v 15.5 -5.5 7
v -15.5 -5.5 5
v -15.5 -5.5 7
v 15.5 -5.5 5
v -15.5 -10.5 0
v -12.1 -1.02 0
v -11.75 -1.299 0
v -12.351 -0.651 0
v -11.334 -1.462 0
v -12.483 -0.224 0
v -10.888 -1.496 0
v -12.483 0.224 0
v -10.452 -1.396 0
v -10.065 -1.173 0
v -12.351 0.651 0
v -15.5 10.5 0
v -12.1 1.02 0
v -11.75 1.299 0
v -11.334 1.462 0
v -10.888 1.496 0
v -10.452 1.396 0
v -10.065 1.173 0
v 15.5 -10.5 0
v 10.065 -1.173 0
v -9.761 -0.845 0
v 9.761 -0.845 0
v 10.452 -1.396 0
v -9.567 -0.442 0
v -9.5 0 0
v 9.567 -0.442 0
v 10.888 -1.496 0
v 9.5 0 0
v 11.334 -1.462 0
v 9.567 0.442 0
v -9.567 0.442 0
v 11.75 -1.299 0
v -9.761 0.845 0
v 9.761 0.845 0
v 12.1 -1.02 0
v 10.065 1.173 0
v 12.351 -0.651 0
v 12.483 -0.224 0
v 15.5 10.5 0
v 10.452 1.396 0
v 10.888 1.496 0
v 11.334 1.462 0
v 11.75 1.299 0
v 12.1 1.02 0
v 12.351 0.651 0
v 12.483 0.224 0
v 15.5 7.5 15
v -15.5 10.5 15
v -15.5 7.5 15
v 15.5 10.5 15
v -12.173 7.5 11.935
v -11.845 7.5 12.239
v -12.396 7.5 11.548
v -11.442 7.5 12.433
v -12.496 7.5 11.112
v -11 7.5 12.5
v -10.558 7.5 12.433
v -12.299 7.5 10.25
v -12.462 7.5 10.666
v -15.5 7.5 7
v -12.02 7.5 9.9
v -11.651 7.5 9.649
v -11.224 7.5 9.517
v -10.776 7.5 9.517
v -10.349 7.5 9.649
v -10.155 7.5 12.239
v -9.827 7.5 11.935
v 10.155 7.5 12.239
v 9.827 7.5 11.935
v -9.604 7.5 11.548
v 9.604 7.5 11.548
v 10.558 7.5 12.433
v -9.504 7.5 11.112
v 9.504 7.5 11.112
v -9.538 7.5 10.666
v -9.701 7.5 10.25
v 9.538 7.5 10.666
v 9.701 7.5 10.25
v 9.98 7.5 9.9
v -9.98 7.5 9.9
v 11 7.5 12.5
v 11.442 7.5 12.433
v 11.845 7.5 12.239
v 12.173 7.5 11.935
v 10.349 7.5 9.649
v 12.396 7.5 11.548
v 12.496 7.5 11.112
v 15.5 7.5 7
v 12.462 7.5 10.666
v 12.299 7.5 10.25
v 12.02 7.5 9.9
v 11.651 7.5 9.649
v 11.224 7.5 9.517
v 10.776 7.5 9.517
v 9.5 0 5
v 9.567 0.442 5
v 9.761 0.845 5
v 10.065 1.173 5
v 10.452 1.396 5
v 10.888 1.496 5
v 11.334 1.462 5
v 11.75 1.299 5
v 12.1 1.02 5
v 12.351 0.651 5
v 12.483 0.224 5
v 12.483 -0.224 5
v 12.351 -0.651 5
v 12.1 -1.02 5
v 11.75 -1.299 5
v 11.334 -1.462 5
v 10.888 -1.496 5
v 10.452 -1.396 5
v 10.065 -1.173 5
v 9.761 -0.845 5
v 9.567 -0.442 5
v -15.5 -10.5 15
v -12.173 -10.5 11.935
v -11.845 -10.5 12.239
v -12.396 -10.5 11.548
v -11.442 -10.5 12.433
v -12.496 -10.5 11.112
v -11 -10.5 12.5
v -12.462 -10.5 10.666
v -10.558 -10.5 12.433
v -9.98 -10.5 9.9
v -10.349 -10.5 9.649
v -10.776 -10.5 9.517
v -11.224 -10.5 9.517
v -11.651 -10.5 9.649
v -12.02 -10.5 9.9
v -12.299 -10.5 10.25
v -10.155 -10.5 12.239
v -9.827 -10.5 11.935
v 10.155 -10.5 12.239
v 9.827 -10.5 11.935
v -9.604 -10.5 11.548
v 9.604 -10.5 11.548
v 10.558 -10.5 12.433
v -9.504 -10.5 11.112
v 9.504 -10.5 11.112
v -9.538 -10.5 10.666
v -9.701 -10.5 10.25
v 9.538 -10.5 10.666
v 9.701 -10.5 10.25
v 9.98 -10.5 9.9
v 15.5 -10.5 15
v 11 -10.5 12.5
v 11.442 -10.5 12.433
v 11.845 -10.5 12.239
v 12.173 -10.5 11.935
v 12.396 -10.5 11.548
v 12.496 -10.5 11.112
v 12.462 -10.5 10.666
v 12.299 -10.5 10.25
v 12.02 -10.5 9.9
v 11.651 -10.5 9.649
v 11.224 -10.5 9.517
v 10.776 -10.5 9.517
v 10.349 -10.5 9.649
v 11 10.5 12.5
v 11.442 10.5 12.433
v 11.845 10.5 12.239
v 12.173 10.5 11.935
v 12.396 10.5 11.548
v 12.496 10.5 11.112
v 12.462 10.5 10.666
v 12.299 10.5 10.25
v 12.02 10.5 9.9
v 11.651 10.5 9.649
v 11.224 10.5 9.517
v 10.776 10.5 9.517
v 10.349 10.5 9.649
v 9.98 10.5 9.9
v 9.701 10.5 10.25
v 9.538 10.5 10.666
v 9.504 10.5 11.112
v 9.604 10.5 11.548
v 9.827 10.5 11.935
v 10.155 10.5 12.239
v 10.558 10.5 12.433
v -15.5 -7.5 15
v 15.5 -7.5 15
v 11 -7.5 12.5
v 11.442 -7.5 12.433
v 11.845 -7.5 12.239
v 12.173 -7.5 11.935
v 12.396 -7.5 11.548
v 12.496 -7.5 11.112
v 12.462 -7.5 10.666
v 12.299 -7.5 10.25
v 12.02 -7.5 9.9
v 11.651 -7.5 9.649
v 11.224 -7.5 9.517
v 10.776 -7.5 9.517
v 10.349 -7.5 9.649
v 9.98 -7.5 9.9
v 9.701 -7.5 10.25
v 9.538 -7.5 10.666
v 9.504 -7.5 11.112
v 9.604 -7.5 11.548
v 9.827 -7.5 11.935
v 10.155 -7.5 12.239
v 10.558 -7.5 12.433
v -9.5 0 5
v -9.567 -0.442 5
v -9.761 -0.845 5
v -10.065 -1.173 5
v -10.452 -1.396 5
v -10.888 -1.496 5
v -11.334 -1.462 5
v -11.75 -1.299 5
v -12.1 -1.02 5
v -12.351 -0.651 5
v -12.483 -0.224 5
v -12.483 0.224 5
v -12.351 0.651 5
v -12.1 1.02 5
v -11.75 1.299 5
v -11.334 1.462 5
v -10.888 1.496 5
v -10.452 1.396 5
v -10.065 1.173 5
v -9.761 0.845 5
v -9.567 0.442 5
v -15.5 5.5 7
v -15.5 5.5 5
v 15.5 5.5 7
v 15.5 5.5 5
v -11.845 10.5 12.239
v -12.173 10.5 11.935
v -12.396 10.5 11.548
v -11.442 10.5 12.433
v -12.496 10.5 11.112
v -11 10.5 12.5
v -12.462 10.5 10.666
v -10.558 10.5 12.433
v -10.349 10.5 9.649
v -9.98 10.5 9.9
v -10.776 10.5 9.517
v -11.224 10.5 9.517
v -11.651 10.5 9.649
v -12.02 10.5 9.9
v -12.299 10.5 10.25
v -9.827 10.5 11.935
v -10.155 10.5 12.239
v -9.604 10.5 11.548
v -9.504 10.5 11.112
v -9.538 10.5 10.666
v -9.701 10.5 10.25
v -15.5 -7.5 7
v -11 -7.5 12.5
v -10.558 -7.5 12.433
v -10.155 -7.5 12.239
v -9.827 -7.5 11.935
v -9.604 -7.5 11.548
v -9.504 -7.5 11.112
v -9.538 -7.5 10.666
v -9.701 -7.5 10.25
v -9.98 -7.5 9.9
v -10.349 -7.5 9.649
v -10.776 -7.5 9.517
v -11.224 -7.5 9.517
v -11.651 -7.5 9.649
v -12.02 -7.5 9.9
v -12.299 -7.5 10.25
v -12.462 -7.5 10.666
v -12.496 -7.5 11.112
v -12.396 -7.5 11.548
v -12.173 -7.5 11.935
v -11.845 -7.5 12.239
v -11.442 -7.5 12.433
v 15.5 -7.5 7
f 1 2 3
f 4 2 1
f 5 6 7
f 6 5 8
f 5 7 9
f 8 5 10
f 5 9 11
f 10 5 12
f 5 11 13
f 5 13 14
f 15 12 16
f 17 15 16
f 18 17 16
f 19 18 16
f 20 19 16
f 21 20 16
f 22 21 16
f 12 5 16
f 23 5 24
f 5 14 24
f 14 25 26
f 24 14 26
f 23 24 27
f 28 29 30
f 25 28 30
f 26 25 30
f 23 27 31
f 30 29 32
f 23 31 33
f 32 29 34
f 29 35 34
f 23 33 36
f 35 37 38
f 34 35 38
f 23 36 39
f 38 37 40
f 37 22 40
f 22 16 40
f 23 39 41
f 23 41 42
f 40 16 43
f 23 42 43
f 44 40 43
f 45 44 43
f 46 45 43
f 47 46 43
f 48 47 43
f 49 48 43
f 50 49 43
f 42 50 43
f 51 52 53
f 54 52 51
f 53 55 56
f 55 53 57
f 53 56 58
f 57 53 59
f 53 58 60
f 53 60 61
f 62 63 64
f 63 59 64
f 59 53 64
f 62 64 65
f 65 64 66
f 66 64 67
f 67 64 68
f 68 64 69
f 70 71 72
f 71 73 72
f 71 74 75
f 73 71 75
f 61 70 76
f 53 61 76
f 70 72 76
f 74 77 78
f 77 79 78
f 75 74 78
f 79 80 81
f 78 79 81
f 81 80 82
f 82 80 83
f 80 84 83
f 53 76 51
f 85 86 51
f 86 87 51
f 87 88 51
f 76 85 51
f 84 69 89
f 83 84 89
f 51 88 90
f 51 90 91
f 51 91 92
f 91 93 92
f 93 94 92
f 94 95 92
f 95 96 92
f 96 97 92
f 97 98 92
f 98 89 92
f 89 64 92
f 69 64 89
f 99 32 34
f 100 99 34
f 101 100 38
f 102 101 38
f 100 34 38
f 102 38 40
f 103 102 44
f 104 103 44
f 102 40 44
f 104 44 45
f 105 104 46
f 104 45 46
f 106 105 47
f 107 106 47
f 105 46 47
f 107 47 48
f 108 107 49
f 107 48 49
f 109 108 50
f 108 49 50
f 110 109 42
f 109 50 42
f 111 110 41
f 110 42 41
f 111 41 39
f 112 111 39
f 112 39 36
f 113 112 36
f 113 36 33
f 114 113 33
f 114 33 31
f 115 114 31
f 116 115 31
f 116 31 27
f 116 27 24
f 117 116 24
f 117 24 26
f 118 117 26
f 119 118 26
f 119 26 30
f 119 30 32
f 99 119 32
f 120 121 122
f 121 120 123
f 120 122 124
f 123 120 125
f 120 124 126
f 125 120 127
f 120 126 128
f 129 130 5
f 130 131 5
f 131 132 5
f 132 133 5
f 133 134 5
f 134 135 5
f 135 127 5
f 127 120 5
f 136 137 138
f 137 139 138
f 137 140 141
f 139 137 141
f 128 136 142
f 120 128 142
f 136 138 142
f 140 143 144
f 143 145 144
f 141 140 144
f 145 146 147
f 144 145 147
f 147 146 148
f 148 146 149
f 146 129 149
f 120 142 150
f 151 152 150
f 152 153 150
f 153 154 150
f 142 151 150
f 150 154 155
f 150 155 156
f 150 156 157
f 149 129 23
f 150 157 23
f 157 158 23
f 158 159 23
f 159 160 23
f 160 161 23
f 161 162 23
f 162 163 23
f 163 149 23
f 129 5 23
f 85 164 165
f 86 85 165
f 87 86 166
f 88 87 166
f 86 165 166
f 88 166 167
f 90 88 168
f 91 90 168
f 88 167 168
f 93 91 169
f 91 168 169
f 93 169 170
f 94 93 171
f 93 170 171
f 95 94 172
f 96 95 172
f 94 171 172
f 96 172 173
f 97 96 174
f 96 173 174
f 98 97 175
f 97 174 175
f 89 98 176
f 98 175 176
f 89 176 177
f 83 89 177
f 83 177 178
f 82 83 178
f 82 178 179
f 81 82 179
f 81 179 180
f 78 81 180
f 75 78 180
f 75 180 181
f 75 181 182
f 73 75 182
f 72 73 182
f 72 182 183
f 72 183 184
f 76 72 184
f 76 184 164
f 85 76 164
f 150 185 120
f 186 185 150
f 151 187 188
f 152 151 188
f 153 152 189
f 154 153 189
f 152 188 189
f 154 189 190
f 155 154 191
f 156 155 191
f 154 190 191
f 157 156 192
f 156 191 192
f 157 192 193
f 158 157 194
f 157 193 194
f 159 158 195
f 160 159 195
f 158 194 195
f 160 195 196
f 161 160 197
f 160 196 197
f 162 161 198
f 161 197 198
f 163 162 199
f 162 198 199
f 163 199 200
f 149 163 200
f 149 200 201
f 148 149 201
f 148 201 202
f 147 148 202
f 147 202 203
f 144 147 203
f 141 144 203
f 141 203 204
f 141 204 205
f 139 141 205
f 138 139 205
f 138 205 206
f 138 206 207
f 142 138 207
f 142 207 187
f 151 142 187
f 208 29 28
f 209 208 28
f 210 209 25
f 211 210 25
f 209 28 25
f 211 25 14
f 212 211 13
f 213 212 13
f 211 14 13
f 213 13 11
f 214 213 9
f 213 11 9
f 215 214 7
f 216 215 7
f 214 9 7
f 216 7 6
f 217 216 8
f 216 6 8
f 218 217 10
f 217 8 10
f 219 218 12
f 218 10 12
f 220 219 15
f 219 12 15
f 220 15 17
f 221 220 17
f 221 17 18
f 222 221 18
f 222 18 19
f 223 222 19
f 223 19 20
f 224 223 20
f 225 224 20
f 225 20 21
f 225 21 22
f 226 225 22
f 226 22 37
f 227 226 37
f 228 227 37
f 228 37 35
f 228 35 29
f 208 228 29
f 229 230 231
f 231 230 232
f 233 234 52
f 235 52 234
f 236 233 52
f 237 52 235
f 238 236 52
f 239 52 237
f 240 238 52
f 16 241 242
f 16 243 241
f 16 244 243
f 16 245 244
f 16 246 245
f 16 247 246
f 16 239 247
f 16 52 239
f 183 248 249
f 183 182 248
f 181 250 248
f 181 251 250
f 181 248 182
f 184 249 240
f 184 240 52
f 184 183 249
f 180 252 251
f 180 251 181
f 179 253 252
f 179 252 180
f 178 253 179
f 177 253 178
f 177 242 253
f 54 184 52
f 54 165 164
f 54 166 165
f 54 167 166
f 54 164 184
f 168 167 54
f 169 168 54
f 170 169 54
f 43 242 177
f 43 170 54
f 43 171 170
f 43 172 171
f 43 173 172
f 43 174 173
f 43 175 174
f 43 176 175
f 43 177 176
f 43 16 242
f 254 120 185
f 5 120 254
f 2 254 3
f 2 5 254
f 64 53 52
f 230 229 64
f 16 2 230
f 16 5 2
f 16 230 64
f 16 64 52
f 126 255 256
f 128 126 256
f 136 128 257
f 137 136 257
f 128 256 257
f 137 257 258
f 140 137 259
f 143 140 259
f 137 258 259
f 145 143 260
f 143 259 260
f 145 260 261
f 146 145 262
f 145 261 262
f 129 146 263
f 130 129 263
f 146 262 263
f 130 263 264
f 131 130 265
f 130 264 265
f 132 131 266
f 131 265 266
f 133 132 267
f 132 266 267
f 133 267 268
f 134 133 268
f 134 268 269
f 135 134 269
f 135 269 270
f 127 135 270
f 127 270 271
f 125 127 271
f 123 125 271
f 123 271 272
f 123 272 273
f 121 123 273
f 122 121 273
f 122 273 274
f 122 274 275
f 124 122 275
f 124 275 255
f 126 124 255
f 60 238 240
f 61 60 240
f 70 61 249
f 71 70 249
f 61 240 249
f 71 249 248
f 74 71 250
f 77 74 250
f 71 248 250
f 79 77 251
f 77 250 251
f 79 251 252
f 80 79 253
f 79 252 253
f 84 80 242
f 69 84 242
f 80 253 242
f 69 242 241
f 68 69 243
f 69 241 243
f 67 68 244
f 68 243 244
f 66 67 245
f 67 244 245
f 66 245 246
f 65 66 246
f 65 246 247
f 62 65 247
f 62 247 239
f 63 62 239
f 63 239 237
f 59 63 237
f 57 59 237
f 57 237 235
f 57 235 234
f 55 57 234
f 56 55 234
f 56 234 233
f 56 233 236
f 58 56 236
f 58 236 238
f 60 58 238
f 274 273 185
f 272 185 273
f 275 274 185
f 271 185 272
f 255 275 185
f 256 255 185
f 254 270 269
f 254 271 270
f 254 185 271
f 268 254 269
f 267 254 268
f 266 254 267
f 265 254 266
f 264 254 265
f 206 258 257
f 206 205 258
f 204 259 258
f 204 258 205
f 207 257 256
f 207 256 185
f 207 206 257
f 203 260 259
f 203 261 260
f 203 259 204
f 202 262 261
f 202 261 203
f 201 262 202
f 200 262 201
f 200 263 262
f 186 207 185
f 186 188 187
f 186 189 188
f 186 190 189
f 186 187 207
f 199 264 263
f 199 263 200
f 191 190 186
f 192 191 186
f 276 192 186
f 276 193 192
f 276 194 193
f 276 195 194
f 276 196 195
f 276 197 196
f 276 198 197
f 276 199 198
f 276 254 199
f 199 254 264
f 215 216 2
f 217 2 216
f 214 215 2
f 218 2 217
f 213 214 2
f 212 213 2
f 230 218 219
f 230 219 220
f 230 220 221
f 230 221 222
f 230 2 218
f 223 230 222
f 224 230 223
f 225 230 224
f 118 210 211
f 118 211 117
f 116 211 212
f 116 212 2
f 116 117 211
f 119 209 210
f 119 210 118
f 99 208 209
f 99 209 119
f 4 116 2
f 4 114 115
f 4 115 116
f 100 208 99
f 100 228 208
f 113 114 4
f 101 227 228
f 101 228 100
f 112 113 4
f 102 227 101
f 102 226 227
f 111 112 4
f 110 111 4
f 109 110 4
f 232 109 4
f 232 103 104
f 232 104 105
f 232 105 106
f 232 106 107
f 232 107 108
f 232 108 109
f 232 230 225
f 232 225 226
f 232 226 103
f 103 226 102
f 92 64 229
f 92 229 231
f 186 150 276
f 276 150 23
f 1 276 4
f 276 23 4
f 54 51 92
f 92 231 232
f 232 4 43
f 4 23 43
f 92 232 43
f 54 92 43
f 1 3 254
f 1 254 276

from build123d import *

# Parameters (mm, degrees)
SKETCH_1_W          = 31
SKETCH_1_H          = 21
EXTRUDE_1_DEPTH     = 5
SKETCH_2_W          = 31
SKETCH_2_H          = 3
EXTRUDE_2_DEPTH     = 10
SKETCH_5_R          = 1.5
CUT_EXTRUDE_2_DEPTH = 31.103986447
SKETCH_6_R          = 1.5
CUT_EXTRUDE_3_DEPTH = 24.989581072
SKETCH_7_W          = 31
SKETCH_7_H          = 2
EXTRUDE_3_DEPTH     = 2


with BuildPart() as part:
    # 草图1 → 凸台-拉伸1 (new body)
    with BuildSketch(Plane.XY):
        Rectangle(SKETCH_1_W, SKETCH_1_H)
    extrude(amount=EXTRUDE_1_DEPTH)

    # 草图2 → 凸台-拉伸2 (add)
    with BuildSketch(Plane.XY.offset(5)):
        with Locations((0, 9)):
            Rectangle(SKETCH_2_W, SKETCH_2_H)
        with Locations((0, -9)):
            Rectangle(SKETCH_2_W, SKETCH_2_H)
    extrude(amount=EXTRUDE_2_DEPTH)

    # 草图5 → 切除-拉伸2 (cut, through all)
    with BuildSketch(Plane(origin=(0, 10.5, 0), x_dir=(1, 0, 0), z_dir=(0, 1, 0))):
        with Locations(Location((11, -11, 0), (0, 0, 270))):
            Circle(SKETCH_5_R)
        with Locations(Location((-11, -11, 0), (0, 0, 270))):
            Circle(SKETCH_5_R)
    extrude(amount=-CUT_EXTRUDE_2_DEPTH, mode=Mode.SUBTRACT)

    # 草图6 → 切除-拉伸3 (cut, through all)
    with BuildSketch(Plane(origin=(0, 0, 0), x_dir=(-1, 0, 0), z_dir=(0, 0, -1))):
        with Locations((-11, 0)):
            Circle(SKETCH_6_R)
        with Locations(Location((11, 0, 0), (0, 0, 180))):
            Circle(SKETCH_6_R)
    extrude(amount=-CUT_EXTRUDE_3_DEPTH, mode=Mode.SUBTRACT)

    # 草图7 → 凸台-拉伸3 (add)
    with BuildSketch(Plane.XY.offset(5)):
        with Locations((0, -6.5)):
            Rectangle(SKETCH_7_W, SKETCH_7_H)
        with Locations((0, 6.5)):
            Rectangle(SKETCH_7_W, SKETCH_7_H)
    extrude(amount=EXTRUDE_3_DEPTH)


solid = part.part
